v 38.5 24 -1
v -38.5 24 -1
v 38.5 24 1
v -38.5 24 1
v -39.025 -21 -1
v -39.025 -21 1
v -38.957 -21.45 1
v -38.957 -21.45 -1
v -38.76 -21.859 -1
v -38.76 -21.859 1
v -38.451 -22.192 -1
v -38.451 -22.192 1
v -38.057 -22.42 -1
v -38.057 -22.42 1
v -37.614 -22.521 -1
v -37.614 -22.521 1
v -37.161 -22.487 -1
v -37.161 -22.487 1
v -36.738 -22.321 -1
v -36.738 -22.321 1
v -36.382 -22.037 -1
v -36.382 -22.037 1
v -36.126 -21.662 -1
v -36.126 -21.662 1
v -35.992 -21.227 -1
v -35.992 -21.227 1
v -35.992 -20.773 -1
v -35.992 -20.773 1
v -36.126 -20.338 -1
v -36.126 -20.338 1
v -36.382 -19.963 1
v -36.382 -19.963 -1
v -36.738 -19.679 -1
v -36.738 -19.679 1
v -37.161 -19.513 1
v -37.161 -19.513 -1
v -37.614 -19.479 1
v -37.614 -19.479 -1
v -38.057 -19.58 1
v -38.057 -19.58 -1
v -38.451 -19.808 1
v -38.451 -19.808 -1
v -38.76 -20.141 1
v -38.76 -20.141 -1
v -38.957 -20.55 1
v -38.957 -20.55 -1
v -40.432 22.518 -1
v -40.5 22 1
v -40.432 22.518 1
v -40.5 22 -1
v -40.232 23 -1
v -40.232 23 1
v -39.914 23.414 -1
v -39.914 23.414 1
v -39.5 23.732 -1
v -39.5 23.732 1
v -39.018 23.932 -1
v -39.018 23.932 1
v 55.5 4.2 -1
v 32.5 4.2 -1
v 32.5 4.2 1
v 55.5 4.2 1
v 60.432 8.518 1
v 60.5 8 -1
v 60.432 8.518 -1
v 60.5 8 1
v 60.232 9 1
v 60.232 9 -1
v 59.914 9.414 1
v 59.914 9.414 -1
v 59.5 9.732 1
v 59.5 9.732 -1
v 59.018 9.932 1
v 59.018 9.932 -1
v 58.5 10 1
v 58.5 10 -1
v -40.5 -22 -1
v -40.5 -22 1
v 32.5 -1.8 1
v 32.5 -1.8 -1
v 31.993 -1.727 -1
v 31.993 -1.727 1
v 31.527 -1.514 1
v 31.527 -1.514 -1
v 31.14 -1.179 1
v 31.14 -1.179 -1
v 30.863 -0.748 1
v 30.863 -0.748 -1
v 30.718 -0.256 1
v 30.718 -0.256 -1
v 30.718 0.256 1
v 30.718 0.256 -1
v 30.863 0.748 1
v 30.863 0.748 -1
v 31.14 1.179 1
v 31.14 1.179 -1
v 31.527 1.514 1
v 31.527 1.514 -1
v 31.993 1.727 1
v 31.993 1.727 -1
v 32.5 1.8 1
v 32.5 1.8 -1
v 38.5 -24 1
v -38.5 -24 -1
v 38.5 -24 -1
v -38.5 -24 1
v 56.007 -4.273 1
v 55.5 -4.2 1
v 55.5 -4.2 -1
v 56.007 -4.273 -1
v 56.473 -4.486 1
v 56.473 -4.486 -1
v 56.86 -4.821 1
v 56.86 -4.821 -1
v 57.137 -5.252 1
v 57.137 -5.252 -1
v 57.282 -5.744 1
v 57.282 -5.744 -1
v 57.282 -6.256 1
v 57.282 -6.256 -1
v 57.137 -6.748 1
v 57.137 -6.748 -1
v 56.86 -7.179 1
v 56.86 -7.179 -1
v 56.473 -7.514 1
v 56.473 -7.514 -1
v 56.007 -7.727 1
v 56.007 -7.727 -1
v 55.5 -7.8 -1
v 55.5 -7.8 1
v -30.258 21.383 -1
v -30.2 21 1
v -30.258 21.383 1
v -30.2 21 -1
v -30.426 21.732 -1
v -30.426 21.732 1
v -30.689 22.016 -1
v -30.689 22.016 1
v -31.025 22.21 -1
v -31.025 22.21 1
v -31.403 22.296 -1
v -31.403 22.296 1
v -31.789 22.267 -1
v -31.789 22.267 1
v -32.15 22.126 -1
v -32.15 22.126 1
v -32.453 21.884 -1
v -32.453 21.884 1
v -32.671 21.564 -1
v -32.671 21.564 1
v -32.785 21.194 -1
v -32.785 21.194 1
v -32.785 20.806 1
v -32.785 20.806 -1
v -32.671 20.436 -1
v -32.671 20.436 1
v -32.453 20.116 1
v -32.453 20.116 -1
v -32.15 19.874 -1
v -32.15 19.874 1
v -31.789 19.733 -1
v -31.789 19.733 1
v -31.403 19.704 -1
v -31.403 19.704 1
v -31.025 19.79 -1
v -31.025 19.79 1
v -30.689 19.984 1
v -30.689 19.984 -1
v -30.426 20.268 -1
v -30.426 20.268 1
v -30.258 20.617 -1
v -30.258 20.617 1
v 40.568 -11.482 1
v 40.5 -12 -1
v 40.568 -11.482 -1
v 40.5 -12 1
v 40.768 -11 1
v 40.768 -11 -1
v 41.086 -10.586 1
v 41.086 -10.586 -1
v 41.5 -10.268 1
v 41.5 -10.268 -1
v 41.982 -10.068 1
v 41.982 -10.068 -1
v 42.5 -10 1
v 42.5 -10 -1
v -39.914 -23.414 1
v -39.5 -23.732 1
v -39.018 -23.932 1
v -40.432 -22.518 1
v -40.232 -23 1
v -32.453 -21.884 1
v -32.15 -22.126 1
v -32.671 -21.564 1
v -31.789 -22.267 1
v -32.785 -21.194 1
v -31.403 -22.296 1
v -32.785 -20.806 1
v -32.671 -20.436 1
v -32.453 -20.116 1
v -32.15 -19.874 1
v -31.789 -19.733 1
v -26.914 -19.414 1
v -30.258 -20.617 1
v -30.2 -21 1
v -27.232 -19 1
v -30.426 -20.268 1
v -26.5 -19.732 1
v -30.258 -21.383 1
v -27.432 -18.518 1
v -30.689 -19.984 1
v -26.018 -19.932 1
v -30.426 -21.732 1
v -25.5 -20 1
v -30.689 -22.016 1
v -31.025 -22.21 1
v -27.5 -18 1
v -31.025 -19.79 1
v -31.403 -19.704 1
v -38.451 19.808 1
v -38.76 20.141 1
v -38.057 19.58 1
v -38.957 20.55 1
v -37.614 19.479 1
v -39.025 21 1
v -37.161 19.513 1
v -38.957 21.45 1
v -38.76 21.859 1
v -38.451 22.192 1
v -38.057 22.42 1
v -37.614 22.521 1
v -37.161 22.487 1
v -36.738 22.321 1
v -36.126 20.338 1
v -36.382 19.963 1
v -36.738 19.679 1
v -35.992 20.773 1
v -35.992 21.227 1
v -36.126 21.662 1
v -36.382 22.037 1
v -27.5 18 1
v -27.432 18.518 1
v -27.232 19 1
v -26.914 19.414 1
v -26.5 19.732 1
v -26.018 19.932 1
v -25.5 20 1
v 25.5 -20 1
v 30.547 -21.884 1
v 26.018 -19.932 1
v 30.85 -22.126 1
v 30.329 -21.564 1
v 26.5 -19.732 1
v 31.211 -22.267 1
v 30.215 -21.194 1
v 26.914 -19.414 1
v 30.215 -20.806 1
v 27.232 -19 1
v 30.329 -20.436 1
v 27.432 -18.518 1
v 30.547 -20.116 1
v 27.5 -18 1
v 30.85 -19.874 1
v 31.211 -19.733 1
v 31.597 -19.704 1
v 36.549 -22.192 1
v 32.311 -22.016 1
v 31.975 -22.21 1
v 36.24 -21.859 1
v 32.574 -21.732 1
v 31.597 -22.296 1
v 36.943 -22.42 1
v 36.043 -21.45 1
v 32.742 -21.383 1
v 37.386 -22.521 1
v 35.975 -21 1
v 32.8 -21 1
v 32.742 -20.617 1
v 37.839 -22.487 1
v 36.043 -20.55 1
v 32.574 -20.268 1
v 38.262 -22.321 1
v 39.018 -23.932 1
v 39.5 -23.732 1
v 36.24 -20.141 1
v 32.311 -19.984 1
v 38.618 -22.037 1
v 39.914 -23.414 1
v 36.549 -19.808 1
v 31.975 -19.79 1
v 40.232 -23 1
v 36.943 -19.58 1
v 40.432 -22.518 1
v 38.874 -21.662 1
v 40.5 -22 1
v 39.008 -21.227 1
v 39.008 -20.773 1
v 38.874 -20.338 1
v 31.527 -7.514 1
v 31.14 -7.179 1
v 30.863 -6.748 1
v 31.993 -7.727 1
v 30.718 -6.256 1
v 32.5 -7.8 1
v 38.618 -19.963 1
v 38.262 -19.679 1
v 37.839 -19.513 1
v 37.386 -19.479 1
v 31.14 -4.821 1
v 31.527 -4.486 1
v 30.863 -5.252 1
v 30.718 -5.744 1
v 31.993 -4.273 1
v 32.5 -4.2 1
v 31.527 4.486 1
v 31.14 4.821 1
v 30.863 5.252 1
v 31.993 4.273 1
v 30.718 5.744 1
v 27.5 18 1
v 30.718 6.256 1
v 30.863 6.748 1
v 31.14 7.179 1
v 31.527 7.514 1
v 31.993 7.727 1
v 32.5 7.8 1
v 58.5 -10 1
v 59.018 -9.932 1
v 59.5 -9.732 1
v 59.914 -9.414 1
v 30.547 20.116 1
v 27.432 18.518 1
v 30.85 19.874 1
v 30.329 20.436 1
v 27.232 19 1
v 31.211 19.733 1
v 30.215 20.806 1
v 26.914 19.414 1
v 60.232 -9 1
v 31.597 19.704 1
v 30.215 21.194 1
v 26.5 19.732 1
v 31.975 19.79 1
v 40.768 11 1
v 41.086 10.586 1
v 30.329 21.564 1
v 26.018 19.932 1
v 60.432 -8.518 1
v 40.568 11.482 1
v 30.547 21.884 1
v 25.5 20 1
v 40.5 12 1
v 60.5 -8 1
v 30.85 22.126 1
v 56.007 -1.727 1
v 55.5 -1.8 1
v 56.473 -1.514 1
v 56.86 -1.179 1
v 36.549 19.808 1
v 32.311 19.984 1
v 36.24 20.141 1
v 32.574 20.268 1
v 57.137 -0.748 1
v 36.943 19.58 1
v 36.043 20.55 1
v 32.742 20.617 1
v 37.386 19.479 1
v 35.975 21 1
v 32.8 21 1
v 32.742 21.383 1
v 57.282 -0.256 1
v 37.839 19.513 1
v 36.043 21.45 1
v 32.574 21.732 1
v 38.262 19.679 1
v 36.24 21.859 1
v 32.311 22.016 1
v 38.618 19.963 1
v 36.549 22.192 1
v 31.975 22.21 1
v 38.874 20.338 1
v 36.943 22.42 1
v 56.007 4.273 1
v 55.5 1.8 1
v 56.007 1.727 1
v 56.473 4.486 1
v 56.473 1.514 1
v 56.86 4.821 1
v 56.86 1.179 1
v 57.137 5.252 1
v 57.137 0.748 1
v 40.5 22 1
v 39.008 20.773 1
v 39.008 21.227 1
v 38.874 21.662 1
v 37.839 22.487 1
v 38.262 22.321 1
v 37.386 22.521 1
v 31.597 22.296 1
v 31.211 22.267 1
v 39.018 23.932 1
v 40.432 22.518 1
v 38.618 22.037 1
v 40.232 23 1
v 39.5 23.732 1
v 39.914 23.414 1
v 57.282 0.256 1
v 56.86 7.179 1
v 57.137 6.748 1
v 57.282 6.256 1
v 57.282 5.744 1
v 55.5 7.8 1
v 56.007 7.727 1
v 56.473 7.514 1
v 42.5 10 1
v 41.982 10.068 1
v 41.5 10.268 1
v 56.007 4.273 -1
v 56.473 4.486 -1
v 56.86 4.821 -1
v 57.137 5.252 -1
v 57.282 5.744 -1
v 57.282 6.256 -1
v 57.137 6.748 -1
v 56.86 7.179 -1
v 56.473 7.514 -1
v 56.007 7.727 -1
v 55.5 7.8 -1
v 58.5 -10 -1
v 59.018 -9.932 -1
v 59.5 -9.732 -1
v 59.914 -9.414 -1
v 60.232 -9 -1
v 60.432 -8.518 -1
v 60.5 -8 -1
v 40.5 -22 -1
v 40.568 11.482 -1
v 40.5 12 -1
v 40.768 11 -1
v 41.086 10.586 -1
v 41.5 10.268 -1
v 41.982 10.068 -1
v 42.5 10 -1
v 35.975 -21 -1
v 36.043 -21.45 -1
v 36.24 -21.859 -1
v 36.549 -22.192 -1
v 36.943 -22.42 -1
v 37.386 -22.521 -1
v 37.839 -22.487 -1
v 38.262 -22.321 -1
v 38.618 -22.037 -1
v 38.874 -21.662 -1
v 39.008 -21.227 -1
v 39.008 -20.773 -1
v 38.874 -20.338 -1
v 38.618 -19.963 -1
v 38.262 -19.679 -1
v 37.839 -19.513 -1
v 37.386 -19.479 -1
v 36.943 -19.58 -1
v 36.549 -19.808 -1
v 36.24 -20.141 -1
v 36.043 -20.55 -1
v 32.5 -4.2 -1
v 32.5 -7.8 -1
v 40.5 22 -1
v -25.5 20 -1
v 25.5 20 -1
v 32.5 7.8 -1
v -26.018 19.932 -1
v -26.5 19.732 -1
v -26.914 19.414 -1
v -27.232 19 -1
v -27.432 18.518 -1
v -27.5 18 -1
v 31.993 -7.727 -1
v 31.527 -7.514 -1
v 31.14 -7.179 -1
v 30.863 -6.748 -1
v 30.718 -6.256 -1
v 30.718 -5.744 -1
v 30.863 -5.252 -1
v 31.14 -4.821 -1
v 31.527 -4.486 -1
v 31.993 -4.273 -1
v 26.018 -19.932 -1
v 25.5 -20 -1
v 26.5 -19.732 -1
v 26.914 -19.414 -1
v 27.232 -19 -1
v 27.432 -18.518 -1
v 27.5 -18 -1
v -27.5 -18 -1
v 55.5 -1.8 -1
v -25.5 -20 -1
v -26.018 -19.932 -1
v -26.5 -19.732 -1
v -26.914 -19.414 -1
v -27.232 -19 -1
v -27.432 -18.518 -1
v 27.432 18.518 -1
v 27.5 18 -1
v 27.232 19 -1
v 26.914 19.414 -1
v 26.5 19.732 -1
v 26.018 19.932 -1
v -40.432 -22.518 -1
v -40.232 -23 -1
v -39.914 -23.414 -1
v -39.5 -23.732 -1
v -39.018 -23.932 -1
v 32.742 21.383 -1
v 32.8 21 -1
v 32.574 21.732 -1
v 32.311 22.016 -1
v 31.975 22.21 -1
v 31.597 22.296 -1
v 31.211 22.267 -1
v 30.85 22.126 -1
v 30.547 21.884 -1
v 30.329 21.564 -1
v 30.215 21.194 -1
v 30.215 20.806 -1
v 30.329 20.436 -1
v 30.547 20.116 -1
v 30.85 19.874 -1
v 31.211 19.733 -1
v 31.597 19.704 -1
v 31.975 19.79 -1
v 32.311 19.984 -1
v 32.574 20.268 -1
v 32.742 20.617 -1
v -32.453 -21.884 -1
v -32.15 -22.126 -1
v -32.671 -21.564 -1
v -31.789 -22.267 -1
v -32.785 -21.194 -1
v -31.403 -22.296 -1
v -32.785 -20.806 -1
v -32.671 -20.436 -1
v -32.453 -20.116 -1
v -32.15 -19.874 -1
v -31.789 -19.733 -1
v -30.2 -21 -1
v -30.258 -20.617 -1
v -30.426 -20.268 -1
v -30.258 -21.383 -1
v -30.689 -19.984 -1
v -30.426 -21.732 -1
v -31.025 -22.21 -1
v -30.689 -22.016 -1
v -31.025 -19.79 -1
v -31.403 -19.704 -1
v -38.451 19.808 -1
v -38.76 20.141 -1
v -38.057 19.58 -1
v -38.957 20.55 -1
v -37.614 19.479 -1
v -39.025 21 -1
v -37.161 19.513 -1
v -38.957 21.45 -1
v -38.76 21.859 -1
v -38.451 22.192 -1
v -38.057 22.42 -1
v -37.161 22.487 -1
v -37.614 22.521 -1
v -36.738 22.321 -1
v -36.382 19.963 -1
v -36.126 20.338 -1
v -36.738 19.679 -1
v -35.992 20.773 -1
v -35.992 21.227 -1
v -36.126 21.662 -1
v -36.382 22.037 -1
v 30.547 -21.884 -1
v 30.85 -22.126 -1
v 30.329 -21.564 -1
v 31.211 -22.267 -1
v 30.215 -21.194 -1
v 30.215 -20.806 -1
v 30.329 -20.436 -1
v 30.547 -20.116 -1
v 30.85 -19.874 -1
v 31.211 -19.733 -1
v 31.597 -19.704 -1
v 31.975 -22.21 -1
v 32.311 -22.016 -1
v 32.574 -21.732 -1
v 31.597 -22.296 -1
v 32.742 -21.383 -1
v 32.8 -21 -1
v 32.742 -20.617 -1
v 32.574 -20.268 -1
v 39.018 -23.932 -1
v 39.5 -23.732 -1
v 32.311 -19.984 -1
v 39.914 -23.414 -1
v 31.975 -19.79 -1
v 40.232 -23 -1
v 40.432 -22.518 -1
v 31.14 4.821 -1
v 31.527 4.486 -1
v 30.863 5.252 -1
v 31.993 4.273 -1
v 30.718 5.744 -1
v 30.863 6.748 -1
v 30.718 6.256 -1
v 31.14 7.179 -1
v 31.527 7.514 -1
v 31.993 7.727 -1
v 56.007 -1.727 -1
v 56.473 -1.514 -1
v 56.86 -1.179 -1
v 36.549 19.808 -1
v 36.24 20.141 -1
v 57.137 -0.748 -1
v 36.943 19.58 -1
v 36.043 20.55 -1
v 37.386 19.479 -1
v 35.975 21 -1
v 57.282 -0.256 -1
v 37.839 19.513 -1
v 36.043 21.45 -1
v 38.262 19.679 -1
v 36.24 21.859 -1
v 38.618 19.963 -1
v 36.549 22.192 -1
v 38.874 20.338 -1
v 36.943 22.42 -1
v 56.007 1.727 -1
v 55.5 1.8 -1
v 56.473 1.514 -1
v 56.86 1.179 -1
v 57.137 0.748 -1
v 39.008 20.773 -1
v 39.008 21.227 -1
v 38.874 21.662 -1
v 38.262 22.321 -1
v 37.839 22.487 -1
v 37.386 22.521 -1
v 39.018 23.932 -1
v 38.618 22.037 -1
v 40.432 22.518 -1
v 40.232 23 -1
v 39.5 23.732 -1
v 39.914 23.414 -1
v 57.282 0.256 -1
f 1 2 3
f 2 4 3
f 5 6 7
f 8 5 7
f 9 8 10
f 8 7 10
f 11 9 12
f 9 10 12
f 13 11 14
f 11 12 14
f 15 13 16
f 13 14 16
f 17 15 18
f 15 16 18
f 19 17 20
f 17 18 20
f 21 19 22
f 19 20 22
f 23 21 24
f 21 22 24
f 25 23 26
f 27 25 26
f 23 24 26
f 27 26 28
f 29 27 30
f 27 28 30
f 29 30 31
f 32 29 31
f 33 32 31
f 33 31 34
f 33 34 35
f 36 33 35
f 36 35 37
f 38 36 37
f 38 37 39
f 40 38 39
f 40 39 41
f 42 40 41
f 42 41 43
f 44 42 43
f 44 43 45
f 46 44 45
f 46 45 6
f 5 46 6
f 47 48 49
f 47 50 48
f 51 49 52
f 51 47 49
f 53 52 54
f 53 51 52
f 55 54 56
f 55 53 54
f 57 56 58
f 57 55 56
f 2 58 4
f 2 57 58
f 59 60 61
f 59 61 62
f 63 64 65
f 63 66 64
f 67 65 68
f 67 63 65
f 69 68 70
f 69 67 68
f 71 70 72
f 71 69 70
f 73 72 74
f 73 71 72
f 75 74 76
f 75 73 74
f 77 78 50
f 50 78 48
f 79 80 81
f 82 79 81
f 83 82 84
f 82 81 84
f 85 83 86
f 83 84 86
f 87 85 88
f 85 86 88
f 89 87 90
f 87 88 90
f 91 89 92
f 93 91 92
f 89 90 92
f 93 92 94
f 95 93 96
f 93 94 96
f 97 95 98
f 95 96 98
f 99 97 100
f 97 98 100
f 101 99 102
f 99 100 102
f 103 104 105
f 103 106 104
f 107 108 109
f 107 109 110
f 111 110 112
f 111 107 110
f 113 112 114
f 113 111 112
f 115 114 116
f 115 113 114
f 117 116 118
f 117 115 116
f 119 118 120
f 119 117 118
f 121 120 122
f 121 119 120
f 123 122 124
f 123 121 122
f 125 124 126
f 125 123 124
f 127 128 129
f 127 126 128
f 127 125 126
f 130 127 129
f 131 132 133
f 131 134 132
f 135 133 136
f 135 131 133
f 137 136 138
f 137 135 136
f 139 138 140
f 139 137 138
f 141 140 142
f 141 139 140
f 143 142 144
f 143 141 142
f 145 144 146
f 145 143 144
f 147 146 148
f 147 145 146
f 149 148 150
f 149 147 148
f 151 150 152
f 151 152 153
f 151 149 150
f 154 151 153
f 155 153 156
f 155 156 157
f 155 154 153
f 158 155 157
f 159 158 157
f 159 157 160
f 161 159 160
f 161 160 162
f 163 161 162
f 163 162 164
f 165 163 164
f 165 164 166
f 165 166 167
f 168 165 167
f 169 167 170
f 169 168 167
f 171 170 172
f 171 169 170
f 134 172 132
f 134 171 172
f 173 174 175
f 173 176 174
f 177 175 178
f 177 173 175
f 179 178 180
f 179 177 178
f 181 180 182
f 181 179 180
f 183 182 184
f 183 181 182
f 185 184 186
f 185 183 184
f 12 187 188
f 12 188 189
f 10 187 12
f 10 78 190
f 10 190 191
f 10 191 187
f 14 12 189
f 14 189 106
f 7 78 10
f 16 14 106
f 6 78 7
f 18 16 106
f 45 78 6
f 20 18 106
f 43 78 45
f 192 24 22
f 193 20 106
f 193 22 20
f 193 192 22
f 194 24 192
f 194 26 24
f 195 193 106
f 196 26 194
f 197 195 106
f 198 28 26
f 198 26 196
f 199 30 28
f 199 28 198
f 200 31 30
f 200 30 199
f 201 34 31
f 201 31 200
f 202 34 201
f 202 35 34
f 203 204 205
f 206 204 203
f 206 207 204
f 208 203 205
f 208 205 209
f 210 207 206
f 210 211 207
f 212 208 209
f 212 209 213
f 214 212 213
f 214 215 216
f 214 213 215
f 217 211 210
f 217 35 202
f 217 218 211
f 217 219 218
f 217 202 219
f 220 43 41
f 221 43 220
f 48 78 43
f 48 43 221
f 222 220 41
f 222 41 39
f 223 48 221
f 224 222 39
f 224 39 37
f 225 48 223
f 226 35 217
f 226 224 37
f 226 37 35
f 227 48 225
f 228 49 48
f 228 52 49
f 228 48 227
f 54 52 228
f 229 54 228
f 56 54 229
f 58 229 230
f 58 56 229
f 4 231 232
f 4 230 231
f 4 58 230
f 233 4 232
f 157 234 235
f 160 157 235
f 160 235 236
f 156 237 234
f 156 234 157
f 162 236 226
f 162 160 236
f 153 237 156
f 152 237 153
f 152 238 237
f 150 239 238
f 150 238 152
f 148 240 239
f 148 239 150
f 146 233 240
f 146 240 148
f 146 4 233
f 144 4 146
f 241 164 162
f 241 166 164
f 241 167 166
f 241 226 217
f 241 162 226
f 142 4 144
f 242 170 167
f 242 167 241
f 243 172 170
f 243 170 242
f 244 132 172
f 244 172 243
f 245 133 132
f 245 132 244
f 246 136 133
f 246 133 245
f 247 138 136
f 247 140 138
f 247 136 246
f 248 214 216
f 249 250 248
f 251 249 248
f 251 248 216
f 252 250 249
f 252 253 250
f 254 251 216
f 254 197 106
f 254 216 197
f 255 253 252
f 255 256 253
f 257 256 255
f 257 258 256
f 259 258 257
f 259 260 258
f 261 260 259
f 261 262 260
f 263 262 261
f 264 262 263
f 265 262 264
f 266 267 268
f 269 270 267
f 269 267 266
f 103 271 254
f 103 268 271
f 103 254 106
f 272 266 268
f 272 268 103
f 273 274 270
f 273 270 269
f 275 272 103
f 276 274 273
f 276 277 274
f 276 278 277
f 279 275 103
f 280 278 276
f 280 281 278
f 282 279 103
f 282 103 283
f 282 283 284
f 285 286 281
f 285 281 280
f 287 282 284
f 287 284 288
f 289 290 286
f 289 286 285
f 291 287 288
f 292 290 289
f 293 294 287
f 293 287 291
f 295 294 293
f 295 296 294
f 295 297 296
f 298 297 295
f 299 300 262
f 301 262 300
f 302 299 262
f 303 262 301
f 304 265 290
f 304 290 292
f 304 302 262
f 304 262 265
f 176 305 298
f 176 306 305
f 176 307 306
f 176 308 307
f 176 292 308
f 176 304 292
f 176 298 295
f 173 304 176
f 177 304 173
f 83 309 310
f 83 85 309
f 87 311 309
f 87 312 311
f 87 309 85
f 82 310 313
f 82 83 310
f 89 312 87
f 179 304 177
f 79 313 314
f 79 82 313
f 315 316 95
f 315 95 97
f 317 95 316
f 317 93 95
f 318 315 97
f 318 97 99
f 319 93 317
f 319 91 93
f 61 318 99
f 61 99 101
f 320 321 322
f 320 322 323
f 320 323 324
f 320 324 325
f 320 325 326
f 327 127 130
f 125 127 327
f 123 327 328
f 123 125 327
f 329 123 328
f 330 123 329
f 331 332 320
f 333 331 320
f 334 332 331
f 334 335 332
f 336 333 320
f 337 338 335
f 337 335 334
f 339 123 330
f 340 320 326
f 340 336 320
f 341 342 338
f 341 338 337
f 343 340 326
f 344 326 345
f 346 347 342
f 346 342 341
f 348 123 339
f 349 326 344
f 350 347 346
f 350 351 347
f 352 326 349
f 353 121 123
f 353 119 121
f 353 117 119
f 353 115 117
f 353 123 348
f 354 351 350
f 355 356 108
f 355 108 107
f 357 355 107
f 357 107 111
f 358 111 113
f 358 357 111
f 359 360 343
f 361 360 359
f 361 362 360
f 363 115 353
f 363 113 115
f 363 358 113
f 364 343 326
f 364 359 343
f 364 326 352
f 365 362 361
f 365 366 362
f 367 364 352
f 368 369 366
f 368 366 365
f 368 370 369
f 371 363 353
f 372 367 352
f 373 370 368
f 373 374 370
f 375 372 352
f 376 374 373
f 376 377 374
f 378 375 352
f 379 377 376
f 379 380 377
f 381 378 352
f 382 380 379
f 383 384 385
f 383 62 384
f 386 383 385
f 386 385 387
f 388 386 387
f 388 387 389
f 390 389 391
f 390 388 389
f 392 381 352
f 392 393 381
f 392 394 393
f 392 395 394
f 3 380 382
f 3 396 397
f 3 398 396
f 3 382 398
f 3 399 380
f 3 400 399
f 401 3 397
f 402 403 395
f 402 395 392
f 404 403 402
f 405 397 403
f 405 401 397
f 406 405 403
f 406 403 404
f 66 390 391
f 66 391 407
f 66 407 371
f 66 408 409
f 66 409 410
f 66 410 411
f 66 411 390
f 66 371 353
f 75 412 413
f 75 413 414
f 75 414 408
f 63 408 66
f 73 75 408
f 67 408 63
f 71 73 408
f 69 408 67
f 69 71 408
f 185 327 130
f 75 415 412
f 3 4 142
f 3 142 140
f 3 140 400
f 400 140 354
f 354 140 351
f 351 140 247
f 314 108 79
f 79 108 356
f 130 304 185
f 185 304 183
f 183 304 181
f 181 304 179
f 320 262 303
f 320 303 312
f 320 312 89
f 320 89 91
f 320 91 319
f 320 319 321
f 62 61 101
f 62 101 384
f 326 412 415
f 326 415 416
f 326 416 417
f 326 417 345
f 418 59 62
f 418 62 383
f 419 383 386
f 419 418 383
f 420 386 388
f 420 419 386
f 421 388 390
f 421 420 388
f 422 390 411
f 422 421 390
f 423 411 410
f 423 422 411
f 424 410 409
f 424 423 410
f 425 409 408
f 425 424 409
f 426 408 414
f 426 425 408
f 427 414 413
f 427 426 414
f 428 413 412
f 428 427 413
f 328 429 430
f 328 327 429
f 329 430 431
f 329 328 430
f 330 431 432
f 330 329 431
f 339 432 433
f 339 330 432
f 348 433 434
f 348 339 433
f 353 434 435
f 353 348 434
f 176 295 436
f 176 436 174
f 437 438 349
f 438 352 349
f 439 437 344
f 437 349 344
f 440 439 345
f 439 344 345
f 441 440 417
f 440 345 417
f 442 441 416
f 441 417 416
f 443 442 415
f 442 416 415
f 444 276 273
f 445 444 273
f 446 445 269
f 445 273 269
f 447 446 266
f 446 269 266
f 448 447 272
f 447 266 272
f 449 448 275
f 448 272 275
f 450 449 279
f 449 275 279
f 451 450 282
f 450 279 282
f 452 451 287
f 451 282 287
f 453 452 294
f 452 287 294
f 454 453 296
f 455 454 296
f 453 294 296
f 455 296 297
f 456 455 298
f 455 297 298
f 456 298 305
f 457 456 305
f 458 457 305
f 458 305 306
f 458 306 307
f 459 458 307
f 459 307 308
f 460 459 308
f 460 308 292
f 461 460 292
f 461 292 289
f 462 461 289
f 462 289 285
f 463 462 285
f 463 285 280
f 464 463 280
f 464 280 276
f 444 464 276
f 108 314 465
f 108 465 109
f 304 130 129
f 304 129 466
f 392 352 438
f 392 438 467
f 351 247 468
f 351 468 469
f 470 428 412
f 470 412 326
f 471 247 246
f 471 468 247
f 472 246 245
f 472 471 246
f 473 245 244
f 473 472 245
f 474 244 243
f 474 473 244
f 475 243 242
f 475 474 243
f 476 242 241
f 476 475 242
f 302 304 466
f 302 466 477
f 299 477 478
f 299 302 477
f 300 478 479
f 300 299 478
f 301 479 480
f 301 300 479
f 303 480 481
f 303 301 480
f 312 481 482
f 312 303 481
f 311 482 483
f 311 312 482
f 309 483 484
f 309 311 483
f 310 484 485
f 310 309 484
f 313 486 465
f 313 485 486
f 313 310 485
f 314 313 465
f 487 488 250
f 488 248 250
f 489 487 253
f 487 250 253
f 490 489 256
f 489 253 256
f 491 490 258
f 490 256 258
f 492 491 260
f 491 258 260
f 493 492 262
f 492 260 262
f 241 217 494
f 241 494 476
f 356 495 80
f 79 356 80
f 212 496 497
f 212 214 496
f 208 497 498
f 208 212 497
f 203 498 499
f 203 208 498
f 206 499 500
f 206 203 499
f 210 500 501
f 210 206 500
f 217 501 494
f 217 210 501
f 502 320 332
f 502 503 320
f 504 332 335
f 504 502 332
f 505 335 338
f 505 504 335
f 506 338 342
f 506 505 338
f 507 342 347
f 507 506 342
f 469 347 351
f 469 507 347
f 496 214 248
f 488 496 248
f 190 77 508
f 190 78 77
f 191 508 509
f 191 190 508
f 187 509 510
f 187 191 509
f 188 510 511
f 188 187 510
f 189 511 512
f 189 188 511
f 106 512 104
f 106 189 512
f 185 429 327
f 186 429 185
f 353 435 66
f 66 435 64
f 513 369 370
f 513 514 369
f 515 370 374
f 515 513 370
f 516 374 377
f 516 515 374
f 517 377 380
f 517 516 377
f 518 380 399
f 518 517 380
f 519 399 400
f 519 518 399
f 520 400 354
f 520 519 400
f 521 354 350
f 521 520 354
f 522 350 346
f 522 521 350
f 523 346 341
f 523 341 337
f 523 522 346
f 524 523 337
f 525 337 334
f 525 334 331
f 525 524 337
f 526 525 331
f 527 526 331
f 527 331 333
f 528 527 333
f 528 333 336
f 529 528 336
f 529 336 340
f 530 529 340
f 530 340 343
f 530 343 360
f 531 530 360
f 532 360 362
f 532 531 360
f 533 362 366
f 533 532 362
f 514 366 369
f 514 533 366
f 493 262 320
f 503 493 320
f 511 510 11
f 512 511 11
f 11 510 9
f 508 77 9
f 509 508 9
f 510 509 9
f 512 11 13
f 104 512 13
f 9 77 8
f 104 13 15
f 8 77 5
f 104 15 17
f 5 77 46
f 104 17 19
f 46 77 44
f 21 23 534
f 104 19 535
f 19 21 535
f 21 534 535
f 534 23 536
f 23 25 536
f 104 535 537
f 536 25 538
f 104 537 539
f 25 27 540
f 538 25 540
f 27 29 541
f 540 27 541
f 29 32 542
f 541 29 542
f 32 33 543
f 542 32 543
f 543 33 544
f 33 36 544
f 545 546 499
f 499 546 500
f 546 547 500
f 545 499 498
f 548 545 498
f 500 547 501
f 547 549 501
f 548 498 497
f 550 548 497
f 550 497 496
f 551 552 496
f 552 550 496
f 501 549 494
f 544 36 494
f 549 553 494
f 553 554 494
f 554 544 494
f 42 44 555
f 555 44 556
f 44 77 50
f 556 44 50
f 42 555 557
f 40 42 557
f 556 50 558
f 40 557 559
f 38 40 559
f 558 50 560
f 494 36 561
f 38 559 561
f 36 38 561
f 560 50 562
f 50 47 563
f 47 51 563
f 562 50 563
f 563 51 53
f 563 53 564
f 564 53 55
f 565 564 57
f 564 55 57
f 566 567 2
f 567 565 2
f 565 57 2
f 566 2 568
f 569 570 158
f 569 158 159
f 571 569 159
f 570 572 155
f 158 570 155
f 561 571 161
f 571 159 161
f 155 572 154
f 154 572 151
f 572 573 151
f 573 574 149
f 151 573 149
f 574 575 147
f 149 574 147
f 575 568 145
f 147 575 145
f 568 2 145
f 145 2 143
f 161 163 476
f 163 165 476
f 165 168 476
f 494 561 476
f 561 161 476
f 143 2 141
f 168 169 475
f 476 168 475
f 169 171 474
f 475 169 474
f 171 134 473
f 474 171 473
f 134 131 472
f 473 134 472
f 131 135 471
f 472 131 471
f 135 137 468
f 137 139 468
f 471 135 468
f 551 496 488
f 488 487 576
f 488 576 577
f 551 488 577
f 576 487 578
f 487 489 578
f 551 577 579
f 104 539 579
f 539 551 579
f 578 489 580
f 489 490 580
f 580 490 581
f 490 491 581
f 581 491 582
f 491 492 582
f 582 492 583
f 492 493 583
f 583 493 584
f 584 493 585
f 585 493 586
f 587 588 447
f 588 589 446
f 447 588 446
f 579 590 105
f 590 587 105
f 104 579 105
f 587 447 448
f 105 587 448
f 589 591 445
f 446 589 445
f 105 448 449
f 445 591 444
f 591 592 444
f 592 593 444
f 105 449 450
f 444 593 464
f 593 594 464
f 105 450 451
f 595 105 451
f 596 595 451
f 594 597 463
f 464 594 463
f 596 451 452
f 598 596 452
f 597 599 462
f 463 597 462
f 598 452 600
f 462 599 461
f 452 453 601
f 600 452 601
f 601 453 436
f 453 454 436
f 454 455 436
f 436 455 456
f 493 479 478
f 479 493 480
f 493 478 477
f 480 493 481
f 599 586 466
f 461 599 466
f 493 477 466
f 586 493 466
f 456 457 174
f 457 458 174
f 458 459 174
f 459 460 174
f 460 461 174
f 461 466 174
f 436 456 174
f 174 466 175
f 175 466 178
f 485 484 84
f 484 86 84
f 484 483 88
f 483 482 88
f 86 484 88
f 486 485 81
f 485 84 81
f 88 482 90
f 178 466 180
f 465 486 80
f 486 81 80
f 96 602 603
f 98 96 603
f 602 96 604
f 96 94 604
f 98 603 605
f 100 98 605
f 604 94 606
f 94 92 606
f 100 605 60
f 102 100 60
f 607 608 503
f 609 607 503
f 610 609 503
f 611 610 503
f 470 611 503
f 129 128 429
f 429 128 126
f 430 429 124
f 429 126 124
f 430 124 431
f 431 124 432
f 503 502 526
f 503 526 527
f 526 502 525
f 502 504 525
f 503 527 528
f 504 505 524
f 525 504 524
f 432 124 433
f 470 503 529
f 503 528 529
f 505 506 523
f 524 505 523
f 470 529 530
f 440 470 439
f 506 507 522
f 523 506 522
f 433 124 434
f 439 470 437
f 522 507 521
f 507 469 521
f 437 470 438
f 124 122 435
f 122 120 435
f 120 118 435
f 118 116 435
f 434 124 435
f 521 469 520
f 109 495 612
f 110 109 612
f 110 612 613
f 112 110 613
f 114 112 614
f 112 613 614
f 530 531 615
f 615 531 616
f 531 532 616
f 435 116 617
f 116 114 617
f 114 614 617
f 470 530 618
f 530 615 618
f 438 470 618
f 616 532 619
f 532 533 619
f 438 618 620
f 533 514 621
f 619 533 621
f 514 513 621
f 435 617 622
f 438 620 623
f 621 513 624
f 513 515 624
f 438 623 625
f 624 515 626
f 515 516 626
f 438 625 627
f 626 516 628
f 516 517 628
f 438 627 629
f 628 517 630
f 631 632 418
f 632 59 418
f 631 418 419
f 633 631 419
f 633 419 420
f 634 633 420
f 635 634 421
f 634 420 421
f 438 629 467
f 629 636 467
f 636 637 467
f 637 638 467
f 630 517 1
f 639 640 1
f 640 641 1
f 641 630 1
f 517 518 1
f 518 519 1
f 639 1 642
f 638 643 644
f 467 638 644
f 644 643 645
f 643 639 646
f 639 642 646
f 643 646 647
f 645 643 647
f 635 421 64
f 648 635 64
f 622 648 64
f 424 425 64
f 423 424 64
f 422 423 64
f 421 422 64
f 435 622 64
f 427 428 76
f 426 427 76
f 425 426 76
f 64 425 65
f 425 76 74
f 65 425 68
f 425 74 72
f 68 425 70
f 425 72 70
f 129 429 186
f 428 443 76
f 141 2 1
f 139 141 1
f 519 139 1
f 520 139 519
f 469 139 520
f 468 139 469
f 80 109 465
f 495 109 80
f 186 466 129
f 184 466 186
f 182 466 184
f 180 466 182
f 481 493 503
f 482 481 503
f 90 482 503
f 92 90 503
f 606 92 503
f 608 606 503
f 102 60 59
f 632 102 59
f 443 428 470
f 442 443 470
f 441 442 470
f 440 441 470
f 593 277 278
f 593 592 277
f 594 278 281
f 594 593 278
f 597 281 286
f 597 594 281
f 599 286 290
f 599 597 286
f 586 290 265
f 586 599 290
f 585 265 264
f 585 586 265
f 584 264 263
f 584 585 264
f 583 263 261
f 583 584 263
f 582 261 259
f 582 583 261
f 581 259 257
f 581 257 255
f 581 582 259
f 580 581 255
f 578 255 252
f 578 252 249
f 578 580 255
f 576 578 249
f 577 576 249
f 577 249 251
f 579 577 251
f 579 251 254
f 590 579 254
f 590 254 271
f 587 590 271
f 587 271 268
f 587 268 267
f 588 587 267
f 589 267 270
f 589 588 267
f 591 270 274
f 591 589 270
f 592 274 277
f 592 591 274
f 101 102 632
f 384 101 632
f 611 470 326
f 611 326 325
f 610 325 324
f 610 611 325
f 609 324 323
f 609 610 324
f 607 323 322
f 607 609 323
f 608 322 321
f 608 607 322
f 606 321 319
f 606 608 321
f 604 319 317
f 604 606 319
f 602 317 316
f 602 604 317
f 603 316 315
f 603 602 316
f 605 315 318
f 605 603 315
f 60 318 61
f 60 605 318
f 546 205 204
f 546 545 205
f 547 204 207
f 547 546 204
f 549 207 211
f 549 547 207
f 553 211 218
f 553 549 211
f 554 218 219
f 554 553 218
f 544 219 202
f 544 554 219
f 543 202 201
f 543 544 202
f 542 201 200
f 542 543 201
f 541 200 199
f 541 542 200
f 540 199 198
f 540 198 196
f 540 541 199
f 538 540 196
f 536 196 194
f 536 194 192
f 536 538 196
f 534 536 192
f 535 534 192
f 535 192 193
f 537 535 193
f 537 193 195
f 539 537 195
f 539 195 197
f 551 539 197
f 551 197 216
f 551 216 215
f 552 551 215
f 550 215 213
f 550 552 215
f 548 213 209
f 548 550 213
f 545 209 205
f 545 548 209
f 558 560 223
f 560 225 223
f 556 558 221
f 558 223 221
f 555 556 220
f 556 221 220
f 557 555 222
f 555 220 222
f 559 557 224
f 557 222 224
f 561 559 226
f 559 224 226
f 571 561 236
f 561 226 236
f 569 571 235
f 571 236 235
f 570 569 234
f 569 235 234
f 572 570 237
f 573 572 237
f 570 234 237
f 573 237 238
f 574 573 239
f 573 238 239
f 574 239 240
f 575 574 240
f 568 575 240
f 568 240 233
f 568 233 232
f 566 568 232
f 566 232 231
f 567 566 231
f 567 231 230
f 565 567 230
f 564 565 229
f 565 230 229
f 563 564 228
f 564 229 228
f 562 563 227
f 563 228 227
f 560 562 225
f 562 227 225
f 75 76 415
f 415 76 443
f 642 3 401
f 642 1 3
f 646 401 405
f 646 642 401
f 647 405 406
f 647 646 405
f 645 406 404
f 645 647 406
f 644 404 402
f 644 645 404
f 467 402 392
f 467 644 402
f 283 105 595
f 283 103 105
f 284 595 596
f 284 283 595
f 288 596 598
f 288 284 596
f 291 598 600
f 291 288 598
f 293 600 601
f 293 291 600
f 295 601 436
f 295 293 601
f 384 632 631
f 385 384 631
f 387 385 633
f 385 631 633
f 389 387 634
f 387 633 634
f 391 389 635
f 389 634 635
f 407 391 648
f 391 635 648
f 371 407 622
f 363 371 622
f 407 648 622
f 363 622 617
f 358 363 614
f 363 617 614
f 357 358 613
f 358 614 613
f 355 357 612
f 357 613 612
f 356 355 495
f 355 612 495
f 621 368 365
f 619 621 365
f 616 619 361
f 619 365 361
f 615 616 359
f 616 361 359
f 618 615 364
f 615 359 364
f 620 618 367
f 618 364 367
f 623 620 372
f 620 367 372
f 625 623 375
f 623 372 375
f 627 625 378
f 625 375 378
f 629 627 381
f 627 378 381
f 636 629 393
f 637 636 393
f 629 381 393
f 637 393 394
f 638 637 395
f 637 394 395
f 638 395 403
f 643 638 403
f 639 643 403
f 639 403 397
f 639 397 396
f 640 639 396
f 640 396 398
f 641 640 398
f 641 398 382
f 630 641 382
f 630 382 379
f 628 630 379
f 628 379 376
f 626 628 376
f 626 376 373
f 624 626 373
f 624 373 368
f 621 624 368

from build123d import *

# Parameters (mm, degrees)
SKETCH_1_W          = 81
SKETCH_1_H          = 48
SKETCH_1_R          = 1.3
EXTRUDE_1_DEPTH     = 1
SKETCH_2_R          = 1.525
CUT_EXTRUDE_1_DEPTH = 16
SKETCH_3_W          = 55
SKETCH_3_H          = 40
CUT_EXTRUDE_2_DEPTH = 21
FILLET_1_R          = 2
SKETCH_4_W          = 20
SKETCH_4_H          = 20
EXTRUDE_2_DEPTH     = 2
FILLET_2_R          = 2
CUT_EXTRUDE_3_DEPTH = 11


with BuildPart() as part:
    # 草图1 → 凸台-拉伸1 (new, symmetric)
    with BuildSketch(Plane.XY):
        Rectangle(SKETCH_1_W, SKETCH_1_H)
        with Locations((31.5, -21)):
            Circle(SKETCH_1_R, mode=Mode.SUBTRACT)
        with Locations((-31.5, -21)):
            Circle(SKETCH_1_R, mode=Mode.SUBTRACT)
        with Locations((-31.5, 21)):
            Circle(SKETCH_1_R, mode=Mode.SUBTRACT)
        with Locations((31.5, 21)):
            Circle(SKETCH_1_R, mode=Mode.SUBTRACT)
    extrude(amount=EXTRUDE_1_DEPTH, both=True)

    # 草图2 → 切除-拉伸1 (cut, symmetric)
    with BuildSketch(Plane.XY.offset(1)):
        with Locations(Location((37.5, 21, 0), (0, 0, 180))):
            Circle(SKETCH_2_R)
        with Locations(Location((37.5, -21, 0), (0, 0, 180))):
            Circle(SKETCH_2_R)
        with Locations(Location((-37.5, -21, 0), (0, 0, 180))):
            Circle(SKETCH_2_R)
        with Locations(Location((-37.5, 21, 0), (0, 0, 180))):
            Circle(SKETCH_2_R)
    extrude(amount=CUT_EXTRUDE_1_DEPTH, both=True, mode=Mode.SUBTRACT)

    # 草图3 → 切除-拉伸2 (cut, symmetric)
    with BuildSketch(Plane.XY.offset(1)):
        Rectangle(SKETCH_3_W, SKETCH_3_H)
    extrude(amount=CUT_EXTRUDE_2_DEPTH, both=True, mode=Mode.SUBTRACT)

    # 圆角1
    fillet_1_edges = [part.edges().sort_by_distance(p)[0] for p in [
        (27.5, 20, 0),
        (27.5, -20, 0),
        (-27.5, -20, 0),
        (-27.5, 20, 0),
        (40.5, -24, 0),
        (-40.5, -24, 0),
        (-40.5, 24, 0),
        (40.5, 24, 0),
    ]]
    fillet(fillet_1_edges, radius=FILLET_1_R)

    # 草图4 → 凸台-拉伸2 (add)
    with BuildSketch(Plane(origin=(0, 0, -1), x_dir=(-1, 0, 0), z_dir=(0, 0, -1))):
        with Locations((-50.5, 0)):
            Rectangle(SKETCH_4_W, SKETCH_4_H)
    extrude(amount=-EXTRUDE_2_DEPTH)

    # 圆角2
    fillet_2_edges = [part.edges().sort_by_distance(p)[0] for p in [
        (40.5, 10, 0),
        (40.5, -10, 0),
        (60.5, -10, 0),
        (60.5, 10, 0),
    ]]
    fillet(fillet_2_edges, radius=FILLET_2_R)

    # 草图5 → 切除-拉伸3 (cut, symmetric)
    with BuildSketch(Plane.XY.offset(1)):
        with BuildLine():
            Line((32.5, 1.8), (55.5, 1.8))
            ThreePointArc((55.5, 1.8), (57.3, 0), (55.5, -1.8))
            Line((55.5, -1.8), (32.5, -1.8))
            ThreePointArc((32.5, -1.8), (30.7, 0), (32.5, 1.8))
        make_face()
        with BuildLine():
            Line((32.5, 4.2), (55.5, 4.2))
            ThreePointArc((55.5, 4.2), (57.3, 6), (55.5, 7.8))
            Line((55.5, 7.8), (32.5, 7.8))
            ThreePointArc((32.5, 7.8), (30.7, 6), (32.5, 4.2))
        make_face()
        with BuildLine():
            Line((32.5, -4.2), (55.5, -4.2))
            ThreePointArc((55.5, -4.2), (57.3, -6), (55.5, -7.8))
            Line((55.5, -7.8), (32.5, -7.8))
            ThreePointArc((32.5, -7.8), (30.7, -6), (32.5, -4.2))
        make_face()
    extrude(amount=CUT_EXTRUDE_3_DEPTH, both=True, mode=Mode.SUBTRACT)


solid = part.part
